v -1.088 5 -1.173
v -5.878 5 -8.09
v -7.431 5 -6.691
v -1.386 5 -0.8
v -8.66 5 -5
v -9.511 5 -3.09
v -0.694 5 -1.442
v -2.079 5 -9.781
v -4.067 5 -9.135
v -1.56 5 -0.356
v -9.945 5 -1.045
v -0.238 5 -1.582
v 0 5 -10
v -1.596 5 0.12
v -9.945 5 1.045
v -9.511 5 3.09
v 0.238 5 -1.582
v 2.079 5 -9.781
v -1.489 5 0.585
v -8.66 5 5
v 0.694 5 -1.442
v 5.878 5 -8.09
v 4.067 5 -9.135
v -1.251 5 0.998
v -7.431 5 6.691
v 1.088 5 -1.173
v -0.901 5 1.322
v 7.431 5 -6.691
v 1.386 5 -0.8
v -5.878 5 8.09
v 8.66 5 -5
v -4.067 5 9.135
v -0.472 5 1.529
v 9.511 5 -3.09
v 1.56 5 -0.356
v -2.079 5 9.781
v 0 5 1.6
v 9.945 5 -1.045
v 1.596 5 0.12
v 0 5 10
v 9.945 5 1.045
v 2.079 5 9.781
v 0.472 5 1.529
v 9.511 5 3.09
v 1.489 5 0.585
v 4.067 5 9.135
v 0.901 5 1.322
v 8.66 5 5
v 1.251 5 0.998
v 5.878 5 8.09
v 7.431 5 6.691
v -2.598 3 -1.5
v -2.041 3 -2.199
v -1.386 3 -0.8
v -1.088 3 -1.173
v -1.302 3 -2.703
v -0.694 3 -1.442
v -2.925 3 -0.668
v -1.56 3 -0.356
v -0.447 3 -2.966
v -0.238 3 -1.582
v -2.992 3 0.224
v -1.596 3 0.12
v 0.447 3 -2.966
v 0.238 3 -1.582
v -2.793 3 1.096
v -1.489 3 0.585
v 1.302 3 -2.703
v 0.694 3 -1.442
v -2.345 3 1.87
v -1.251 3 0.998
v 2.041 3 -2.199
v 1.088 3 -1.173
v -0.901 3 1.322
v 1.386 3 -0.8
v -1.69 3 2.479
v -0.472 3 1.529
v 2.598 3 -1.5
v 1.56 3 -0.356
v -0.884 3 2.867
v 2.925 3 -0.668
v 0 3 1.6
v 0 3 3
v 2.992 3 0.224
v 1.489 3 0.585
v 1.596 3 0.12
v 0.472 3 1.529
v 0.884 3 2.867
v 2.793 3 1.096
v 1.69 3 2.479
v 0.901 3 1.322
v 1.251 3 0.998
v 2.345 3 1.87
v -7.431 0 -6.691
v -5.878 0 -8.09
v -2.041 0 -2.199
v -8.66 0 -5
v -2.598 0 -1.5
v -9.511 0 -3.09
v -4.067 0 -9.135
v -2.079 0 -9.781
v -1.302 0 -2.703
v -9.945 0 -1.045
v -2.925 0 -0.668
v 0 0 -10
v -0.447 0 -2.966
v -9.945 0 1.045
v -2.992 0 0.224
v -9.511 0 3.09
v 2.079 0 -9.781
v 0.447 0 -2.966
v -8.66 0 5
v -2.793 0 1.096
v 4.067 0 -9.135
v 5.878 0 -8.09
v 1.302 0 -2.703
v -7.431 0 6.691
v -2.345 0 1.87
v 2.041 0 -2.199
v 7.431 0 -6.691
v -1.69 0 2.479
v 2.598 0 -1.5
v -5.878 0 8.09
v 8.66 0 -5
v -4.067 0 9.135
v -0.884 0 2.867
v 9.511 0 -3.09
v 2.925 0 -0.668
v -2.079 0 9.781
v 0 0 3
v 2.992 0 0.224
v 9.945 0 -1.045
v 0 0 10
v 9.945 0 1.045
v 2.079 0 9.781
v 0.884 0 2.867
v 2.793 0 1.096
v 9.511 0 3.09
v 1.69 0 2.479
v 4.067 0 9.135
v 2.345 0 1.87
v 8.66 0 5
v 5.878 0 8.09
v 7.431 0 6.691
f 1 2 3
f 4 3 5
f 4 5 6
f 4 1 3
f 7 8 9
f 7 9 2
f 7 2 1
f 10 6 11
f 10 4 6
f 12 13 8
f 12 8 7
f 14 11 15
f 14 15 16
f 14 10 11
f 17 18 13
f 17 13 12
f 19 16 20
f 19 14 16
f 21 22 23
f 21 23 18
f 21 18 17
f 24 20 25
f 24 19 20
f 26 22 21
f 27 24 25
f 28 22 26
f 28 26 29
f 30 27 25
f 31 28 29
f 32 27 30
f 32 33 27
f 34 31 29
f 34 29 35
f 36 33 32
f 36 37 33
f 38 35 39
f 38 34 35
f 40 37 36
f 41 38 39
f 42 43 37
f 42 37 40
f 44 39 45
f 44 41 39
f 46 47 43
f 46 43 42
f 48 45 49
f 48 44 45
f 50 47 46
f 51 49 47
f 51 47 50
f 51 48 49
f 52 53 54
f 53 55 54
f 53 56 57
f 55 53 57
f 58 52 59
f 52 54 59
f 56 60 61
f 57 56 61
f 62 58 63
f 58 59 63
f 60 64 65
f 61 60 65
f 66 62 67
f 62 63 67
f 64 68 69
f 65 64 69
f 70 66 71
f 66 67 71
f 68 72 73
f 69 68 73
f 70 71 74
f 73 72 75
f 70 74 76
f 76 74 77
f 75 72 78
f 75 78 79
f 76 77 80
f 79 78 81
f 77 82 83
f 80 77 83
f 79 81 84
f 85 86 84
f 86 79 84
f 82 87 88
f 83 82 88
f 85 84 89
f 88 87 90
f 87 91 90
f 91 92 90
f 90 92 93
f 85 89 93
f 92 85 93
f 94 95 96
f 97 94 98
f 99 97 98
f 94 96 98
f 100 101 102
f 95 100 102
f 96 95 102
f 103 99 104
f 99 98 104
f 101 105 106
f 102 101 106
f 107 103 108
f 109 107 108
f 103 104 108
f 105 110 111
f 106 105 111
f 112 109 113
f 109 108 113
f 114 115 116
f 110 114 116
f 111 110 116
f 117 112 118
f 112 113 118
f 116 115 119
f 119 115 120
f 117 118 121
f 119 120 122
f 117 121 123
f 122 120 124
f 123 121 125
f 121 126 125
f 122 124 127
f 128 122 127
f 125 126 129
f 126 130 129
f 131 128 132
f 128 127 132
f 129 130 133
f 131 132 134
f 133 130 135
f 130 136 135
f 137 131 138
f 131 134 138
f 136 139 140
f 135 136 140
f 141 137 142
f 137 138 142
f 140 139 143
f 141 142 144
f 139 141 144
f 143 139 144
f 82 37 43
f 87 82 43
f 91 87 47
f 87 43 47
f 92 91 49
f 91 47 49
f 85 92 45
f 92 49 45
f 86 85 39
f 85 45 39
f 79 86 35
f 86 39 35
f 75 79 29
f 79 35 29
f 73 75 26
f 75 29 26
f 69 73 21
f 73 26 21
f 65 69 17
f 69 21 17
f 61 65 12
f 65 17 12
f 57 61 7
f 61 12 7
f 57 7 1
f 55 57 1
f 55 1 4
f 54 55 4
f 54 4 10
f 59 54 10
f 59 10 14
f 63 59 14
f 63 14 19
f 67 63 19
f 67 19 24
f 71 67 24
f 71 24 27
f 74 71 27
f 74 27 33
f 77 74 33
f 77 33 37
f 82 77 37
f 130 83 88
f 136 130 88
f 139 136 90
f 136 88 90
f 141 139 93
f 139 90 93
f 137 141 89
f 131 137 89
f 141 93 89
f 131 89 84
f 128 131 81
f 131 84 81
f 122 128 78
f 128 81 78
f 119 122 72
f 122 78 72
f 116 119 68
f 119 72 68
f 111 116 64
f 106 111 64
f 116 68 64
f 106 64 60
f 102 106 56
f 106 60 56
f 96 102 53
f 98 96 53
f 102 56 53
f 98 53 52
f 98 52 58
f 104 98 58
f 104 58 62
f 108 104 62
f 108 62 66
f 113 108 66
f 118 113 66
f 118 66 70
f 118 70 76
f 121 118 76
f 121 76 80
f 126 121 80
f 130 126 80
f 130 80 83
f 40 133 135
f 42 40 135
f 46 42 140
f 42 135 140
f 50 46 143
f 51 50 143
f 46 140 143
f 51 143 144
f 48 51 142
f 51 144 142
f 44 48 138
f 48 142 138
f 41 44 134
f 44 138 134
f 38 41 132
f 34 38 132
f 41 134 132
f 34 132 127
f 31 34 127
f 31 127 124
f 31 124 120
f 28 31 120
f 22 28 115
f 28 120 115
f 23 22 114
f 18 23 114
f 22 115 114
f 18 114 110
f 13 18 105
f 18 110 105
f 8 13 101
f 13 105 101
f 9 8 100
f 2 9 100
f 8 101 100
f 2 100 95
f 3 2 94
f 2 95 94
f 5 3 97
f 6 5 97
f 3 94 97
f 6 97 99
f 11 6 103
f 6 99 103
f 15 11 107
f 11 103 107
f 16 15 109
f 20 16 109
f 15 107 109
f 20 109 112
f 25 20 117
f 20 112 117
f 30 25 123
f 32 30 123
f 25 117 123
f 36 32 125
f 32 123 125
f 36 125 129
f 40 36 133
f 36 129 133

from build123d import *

# Parameters (mm, degrees)
SKETCH1_R           = 10
BOSS_EXTRUDE1_DEPTH = 5
CUT_EXTRUDE1_START  = -2
SKETCH2_R           = 3
CUT_EXTRUDE1_DEPTH  = 5
SKETCH3_R           = 1.6
CUT_EXTRUDE2_DEPTH  = 16


with BuildPart() as part:
    # Sketch1 → Boss-Extrude1 (new body)
    with BuildSketch(Plane(origin=(0, 0, 0), x_dir=(1, 0, 0), z_dir=(0, 1, 0))):
        with Locations(Location((0, 0, 0), (0, 0, 270))):
            Circle(SKETCH1_R)
    extrude(amount=BOSS_EXTRUDE1_DEPTH)

    # Sketch2 → Cut-Extrude1 (cut)
    with BuildSketch(Plane(origin=(0, 5, 0), x_dir=(1, 0, 0), z_dir=(0, 1, 0)).offset(CUT_EXTRUDE1_START)):
        with Locations(Location((0, 0, 0), (0, 0, 270))):
            Circle(SKETCH2_R)
    extrude(amount=-CUT_EXTRUDE1_DEPTH, mode=Mode.SUBTRACT)

    # Sketch3 → Cut-Extrude2 (cut, through all)
    with BuildSketch(Plane(origin=(0, 5, 0), x_dir=(1, 0, 0), z_dir=(0, 1, 0))):
        with Locations(Location((0, 0, 0), (0, 0, 270))):
            Circle(SKETCH3_R)
    extrude(amount=-CUT_EXTRUDE2_DEPTH, mode=Mode.SUBTRACT)


solid = part.part
